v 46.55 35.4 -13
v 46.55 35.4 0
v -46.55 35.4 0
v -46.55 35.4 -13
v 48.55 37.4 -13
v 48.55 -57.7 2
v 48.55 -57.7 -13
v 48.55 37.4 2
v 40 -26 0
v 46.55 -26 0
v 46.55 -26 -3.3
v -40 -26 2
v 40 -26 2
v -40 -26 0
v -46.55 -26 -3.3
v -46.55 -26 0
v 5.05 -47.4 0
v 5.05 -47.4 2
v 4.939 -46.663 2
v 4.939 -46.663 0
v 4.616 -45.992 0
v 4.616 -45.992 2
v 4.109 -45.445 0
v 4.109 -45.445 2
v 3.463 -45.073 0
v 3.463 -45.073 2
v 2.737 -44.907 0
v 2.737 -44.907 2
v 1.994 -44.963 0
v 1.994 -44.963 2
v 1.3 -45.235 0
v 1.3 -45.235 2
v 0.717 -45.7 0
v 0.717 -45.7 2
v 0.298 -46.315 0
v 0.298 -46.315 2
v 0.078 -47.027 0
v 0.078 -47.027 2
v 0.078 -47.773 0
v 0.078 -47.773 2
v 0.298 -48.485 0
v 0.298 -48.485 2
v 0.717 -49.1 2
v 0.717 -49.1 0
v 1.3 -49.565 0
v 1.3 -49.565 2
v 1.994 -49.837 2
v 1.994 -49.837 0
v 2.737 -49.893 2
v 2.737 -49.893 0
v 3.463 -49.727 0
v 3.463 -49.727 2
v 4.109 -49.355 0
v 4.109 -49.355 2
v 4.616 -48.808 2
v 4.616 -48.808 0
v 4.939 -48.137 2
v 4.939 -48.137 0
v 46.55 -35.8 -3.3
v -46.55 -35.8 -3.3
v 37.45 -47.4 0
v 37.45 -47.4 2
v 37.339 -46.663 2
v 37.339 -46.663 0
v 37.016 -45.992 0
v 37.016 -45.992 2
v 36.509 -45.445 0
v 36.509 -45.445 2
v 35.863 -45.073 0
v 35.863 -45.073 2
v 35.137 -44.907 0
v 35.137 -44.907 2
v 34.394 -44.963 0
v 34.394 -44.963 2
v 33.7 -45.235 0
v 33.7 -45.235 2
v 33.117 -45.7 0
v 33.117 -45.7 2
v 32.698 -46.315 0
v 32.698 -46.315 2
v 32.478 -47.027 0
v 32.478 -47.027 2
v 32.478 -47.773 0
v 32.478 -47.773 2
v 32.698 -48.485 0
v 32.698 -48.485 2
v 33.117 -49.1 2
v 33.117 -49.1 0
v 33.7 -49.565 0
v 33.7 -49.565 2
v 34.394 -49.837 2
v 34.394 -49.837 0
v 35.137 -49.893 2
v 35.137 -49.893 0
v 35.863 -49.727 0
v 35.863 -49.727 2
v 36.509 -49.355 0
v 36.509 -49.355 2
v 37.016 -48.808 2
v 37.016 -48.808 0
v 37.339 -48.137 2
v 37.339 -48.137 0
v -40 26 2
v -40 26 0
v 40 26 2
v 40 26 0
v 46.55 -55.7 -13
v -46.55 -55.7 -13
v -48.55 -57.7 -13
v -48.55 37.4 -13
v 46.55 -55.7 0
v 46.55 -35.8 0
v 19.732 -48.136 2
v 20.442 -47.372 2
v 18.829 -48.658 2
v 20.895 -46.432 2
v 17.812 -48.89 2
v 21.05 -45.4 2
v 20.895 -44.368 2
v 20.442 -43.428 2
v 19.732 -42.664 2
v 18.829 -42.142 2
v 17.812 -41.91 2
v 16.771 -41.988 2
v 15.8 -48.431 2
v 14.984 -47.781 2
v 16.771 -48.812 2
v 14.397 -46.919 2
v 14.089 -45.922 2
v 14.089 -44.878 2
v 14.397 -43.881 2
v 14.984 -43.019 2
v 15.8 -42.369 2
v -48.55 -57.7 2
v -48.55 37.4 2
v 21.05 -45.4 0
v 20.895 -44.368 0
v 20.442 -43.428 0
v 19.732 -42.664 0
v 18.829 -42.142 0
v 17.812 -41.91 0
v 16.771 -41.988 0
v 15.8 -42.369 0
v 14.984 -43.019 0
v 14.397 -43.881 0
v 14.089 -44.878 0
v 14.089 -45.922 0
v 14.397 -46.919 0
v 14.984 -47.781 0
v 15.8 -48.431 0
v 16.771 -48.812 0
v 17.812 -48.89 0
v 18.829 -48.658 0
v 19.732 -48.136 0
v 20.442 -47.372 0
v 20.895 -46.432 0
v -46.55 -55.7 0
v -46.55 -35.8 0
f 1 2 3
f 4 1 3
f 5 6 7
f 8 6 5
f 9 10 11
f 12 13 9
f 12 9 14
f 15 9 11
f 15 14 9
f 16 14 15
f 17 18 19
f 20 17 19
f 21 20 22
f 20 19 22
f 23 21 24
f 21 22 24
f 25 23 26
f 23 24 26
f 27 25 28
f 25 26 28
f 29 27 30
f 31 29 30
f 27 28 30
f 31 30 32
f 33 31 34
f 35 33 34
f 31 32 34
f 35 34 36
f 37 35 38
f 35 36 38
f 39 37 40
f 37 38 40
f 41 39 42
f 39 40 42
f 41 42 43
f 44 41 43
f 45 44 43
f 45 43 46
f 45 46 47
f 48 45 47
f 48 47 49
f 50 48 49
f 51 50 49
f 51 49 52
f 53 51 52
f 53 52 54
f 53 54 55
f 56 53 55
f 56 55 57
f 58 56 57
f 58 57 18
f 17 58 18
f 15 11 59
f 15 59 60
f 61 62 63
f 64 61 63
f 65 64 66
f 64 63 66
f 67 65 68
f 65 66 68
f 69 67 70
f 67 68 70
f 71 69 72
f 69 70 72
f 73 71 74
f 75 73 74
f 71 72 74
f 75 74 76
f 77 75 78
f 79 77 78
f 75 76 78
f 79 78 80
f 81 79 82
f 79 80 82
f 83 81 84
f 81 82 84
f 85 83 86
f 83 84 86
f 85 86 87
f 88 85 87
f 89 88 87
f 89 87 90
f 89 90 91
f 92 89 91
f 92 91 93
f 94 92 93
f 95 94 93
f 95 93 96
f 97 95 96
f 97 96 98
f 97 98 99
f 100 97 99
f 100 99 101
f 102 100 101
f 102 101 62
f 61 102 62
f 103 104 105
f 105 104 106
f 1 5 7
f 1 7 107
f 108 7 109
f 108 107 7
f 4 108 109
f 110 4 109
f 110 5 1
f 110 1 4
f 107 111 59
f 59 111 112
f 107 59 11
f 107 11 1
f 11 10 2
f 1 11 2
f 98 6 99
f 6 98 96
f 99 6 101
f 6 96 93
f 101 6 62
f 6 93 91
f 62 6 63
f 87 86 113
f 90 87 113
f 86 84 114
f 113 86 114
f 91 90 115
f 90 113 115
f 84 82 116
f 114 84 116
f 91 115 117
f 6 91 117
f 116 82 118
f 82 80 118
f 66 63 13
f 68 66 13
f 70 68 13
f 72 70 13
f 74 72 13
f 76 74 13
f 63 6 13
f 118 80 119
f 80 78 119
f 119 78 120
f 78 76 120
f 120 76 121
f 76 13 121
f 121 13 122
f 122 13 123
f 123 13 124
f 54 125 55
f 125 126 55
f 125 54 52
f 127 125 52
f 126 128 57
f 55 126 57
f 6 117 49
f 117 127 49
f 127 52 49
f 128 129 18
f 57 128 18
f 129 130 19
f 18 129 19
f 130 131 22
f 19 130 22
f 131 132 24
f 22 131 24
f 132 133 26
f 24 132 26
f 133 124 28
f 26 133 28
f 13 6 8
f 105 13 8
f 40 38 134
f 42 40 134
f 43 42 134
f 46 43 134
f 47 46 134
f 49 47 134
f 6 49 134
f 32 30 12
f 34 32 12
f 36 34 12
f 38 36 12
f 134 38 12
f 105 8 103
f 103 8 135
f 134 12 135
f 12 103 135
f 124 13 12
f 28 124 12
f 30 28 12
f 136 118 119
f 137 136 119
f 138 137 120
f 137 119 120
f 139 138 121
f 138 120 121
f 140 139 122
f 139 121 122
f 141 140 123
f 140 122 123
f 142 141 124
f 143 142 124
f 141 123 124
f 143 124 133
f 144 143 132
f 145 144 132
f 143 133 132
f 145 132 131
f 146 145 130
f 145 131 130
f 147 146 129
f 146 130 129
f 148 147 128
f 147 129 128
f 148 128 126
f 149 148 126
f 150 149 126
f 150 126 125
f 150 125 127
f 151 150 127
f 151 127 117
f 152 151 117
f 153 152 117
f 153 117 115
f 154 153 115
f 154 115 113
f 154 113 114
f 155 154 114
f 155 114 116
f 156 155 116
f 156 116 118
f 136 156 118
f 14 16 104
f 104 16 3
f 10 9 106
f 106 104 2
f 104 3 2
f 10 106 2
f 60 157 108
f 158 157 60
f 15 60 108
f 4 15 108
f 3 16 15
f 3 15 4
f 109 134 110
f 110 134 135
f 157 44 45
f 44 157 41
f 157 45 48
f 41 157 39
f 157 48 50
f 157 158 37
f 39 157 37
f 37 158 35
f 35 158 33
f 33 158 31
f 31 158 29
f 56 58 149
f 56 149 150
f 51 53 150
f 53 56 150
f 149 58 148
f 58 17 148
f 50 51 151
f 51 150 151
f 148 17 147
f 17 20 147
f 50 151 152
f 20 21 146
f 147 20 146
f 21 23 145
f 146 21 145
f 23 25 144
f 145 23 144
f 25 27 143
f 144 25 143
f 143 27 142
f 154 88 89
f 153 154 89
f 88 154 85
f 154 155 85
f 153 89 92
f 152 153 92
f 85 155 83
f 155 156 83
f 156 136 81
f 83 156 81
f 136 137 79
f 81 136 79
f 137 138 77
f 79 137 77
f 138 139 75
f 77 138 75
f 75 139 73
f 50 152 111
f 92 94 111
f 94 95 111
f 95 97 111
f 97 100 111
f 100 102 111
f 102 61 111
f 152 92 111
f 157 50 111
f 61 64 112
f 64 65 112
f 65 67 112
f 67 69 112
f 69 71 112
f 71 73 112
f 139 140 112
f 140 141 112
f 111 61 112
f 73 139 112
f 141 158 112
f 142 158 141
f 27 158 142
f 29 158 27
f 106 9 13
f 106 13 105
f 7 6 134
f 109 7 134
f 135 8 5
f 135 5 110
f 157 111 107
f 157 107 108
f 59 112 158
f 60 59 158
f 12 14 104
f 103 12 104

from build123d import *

# Parameters (mm, degrees)
SKETCH1_W                = 80
SKETCH1_H                = 52
BOSS_EXTRUDE1_DEPTH      = 2
SKETCH2_W                = 93.1
SKETCH2_H                = 9.8
BOSS_EXTRUDE2_DEPTH      = 3.3
BOSS_EXTRUDE3_DEPTH      = 13
BOSS_EXTRUDE3_DEPTH_BACK = 2
SKETCH3_W                = 97.1
SKETCH3_H                = 95.1
SKETCH3_W_2              = 93.1
SKETCH3_H_2              = 91.1
SKETCH4_R                = 3.5
CUT_EXTRUDE1_DEPTH       = 29
SKETCH5_R                = 2.5
CUT_EXTRUDE2_DEPTH       = 29


with BuildPart() as part:
    # Sketch1 → Boss-Extrude1 (new body)
    with BuildSketch(Plane.XY):
        Polygon((-46.55, -35.4), (-46.55, -55.7), (46.55, -55.7), (46.55, -35.4), (46.55, 35.4), (-46.55, 35.4), align=None)
        Rectangle(SKETCH1_W, SKETCH1_H, mode=Mode.SUBTRACT)
    extrude(amount=BOSS_EXTRUDE1_DEPTH)

    # Sketch2 → Boss-Extrude2 (add)
    with BuildSketch(Plane(origin=(0, 0, 0), x_dir=(-1, 0, 0), z_dir=(0, 0, -1))):
        with Locations((0, -30.9)):
            Rectangle(SKETCH2_W, SKETCH2_H)
    extrude(amount=BOSS_EXTRUDE2_DEPTH)

    # Sketch3 → Boss-Extrude3 (add, two sides: drawn at the far end of the back side and taken through both)
    with BuildSketch(Plane(origin=(0, 0, 0), x_dir=(-1, 0, 0), z_dir=(0, 0, -1)).offset(-BOSS_EXTRUDE3_DEPTH_BACK)):
        with Locations((0, -10.15)):
            Rectangle(SKETCH3_W, SKETCH3_H)
        with Locations((0, -10.15)):
            Rectangle(SKETCH3_W_2, SKETCH3_H_2, mode=Mode.SUBTRACT)
    extrude(amount=BOSS_EXTRUDE3_DEPTH + BOSS_EXTRUDE3_DEPTH_BACK)

    # Sketch4 → Cut-Extrude1 (cut)
    with BuildSketch(Plane.XY.offset(2)):
        with Locations((17.55, -45.4)):
            Circle(SKETCH4_R)
    extrude(amount=-CUT_EXTRUDE1_DEPTH, mode=Mode.SUBTRACT)

    # Sketch5 → Cut-Extrude2 (cut)
    with BuildSketch(Plane.XY.offset(2)):
        with Locations((2.55, -47.4)):
            Circle(SKETCH5_R)
        with Locations((34.95, -47.4)):
            Circle(SKETCH5_R)
    extrude(amount=-CUT_EXTRUDE2_DEPTH, mode=Mode.SUBTRACT)


solid = part.part
